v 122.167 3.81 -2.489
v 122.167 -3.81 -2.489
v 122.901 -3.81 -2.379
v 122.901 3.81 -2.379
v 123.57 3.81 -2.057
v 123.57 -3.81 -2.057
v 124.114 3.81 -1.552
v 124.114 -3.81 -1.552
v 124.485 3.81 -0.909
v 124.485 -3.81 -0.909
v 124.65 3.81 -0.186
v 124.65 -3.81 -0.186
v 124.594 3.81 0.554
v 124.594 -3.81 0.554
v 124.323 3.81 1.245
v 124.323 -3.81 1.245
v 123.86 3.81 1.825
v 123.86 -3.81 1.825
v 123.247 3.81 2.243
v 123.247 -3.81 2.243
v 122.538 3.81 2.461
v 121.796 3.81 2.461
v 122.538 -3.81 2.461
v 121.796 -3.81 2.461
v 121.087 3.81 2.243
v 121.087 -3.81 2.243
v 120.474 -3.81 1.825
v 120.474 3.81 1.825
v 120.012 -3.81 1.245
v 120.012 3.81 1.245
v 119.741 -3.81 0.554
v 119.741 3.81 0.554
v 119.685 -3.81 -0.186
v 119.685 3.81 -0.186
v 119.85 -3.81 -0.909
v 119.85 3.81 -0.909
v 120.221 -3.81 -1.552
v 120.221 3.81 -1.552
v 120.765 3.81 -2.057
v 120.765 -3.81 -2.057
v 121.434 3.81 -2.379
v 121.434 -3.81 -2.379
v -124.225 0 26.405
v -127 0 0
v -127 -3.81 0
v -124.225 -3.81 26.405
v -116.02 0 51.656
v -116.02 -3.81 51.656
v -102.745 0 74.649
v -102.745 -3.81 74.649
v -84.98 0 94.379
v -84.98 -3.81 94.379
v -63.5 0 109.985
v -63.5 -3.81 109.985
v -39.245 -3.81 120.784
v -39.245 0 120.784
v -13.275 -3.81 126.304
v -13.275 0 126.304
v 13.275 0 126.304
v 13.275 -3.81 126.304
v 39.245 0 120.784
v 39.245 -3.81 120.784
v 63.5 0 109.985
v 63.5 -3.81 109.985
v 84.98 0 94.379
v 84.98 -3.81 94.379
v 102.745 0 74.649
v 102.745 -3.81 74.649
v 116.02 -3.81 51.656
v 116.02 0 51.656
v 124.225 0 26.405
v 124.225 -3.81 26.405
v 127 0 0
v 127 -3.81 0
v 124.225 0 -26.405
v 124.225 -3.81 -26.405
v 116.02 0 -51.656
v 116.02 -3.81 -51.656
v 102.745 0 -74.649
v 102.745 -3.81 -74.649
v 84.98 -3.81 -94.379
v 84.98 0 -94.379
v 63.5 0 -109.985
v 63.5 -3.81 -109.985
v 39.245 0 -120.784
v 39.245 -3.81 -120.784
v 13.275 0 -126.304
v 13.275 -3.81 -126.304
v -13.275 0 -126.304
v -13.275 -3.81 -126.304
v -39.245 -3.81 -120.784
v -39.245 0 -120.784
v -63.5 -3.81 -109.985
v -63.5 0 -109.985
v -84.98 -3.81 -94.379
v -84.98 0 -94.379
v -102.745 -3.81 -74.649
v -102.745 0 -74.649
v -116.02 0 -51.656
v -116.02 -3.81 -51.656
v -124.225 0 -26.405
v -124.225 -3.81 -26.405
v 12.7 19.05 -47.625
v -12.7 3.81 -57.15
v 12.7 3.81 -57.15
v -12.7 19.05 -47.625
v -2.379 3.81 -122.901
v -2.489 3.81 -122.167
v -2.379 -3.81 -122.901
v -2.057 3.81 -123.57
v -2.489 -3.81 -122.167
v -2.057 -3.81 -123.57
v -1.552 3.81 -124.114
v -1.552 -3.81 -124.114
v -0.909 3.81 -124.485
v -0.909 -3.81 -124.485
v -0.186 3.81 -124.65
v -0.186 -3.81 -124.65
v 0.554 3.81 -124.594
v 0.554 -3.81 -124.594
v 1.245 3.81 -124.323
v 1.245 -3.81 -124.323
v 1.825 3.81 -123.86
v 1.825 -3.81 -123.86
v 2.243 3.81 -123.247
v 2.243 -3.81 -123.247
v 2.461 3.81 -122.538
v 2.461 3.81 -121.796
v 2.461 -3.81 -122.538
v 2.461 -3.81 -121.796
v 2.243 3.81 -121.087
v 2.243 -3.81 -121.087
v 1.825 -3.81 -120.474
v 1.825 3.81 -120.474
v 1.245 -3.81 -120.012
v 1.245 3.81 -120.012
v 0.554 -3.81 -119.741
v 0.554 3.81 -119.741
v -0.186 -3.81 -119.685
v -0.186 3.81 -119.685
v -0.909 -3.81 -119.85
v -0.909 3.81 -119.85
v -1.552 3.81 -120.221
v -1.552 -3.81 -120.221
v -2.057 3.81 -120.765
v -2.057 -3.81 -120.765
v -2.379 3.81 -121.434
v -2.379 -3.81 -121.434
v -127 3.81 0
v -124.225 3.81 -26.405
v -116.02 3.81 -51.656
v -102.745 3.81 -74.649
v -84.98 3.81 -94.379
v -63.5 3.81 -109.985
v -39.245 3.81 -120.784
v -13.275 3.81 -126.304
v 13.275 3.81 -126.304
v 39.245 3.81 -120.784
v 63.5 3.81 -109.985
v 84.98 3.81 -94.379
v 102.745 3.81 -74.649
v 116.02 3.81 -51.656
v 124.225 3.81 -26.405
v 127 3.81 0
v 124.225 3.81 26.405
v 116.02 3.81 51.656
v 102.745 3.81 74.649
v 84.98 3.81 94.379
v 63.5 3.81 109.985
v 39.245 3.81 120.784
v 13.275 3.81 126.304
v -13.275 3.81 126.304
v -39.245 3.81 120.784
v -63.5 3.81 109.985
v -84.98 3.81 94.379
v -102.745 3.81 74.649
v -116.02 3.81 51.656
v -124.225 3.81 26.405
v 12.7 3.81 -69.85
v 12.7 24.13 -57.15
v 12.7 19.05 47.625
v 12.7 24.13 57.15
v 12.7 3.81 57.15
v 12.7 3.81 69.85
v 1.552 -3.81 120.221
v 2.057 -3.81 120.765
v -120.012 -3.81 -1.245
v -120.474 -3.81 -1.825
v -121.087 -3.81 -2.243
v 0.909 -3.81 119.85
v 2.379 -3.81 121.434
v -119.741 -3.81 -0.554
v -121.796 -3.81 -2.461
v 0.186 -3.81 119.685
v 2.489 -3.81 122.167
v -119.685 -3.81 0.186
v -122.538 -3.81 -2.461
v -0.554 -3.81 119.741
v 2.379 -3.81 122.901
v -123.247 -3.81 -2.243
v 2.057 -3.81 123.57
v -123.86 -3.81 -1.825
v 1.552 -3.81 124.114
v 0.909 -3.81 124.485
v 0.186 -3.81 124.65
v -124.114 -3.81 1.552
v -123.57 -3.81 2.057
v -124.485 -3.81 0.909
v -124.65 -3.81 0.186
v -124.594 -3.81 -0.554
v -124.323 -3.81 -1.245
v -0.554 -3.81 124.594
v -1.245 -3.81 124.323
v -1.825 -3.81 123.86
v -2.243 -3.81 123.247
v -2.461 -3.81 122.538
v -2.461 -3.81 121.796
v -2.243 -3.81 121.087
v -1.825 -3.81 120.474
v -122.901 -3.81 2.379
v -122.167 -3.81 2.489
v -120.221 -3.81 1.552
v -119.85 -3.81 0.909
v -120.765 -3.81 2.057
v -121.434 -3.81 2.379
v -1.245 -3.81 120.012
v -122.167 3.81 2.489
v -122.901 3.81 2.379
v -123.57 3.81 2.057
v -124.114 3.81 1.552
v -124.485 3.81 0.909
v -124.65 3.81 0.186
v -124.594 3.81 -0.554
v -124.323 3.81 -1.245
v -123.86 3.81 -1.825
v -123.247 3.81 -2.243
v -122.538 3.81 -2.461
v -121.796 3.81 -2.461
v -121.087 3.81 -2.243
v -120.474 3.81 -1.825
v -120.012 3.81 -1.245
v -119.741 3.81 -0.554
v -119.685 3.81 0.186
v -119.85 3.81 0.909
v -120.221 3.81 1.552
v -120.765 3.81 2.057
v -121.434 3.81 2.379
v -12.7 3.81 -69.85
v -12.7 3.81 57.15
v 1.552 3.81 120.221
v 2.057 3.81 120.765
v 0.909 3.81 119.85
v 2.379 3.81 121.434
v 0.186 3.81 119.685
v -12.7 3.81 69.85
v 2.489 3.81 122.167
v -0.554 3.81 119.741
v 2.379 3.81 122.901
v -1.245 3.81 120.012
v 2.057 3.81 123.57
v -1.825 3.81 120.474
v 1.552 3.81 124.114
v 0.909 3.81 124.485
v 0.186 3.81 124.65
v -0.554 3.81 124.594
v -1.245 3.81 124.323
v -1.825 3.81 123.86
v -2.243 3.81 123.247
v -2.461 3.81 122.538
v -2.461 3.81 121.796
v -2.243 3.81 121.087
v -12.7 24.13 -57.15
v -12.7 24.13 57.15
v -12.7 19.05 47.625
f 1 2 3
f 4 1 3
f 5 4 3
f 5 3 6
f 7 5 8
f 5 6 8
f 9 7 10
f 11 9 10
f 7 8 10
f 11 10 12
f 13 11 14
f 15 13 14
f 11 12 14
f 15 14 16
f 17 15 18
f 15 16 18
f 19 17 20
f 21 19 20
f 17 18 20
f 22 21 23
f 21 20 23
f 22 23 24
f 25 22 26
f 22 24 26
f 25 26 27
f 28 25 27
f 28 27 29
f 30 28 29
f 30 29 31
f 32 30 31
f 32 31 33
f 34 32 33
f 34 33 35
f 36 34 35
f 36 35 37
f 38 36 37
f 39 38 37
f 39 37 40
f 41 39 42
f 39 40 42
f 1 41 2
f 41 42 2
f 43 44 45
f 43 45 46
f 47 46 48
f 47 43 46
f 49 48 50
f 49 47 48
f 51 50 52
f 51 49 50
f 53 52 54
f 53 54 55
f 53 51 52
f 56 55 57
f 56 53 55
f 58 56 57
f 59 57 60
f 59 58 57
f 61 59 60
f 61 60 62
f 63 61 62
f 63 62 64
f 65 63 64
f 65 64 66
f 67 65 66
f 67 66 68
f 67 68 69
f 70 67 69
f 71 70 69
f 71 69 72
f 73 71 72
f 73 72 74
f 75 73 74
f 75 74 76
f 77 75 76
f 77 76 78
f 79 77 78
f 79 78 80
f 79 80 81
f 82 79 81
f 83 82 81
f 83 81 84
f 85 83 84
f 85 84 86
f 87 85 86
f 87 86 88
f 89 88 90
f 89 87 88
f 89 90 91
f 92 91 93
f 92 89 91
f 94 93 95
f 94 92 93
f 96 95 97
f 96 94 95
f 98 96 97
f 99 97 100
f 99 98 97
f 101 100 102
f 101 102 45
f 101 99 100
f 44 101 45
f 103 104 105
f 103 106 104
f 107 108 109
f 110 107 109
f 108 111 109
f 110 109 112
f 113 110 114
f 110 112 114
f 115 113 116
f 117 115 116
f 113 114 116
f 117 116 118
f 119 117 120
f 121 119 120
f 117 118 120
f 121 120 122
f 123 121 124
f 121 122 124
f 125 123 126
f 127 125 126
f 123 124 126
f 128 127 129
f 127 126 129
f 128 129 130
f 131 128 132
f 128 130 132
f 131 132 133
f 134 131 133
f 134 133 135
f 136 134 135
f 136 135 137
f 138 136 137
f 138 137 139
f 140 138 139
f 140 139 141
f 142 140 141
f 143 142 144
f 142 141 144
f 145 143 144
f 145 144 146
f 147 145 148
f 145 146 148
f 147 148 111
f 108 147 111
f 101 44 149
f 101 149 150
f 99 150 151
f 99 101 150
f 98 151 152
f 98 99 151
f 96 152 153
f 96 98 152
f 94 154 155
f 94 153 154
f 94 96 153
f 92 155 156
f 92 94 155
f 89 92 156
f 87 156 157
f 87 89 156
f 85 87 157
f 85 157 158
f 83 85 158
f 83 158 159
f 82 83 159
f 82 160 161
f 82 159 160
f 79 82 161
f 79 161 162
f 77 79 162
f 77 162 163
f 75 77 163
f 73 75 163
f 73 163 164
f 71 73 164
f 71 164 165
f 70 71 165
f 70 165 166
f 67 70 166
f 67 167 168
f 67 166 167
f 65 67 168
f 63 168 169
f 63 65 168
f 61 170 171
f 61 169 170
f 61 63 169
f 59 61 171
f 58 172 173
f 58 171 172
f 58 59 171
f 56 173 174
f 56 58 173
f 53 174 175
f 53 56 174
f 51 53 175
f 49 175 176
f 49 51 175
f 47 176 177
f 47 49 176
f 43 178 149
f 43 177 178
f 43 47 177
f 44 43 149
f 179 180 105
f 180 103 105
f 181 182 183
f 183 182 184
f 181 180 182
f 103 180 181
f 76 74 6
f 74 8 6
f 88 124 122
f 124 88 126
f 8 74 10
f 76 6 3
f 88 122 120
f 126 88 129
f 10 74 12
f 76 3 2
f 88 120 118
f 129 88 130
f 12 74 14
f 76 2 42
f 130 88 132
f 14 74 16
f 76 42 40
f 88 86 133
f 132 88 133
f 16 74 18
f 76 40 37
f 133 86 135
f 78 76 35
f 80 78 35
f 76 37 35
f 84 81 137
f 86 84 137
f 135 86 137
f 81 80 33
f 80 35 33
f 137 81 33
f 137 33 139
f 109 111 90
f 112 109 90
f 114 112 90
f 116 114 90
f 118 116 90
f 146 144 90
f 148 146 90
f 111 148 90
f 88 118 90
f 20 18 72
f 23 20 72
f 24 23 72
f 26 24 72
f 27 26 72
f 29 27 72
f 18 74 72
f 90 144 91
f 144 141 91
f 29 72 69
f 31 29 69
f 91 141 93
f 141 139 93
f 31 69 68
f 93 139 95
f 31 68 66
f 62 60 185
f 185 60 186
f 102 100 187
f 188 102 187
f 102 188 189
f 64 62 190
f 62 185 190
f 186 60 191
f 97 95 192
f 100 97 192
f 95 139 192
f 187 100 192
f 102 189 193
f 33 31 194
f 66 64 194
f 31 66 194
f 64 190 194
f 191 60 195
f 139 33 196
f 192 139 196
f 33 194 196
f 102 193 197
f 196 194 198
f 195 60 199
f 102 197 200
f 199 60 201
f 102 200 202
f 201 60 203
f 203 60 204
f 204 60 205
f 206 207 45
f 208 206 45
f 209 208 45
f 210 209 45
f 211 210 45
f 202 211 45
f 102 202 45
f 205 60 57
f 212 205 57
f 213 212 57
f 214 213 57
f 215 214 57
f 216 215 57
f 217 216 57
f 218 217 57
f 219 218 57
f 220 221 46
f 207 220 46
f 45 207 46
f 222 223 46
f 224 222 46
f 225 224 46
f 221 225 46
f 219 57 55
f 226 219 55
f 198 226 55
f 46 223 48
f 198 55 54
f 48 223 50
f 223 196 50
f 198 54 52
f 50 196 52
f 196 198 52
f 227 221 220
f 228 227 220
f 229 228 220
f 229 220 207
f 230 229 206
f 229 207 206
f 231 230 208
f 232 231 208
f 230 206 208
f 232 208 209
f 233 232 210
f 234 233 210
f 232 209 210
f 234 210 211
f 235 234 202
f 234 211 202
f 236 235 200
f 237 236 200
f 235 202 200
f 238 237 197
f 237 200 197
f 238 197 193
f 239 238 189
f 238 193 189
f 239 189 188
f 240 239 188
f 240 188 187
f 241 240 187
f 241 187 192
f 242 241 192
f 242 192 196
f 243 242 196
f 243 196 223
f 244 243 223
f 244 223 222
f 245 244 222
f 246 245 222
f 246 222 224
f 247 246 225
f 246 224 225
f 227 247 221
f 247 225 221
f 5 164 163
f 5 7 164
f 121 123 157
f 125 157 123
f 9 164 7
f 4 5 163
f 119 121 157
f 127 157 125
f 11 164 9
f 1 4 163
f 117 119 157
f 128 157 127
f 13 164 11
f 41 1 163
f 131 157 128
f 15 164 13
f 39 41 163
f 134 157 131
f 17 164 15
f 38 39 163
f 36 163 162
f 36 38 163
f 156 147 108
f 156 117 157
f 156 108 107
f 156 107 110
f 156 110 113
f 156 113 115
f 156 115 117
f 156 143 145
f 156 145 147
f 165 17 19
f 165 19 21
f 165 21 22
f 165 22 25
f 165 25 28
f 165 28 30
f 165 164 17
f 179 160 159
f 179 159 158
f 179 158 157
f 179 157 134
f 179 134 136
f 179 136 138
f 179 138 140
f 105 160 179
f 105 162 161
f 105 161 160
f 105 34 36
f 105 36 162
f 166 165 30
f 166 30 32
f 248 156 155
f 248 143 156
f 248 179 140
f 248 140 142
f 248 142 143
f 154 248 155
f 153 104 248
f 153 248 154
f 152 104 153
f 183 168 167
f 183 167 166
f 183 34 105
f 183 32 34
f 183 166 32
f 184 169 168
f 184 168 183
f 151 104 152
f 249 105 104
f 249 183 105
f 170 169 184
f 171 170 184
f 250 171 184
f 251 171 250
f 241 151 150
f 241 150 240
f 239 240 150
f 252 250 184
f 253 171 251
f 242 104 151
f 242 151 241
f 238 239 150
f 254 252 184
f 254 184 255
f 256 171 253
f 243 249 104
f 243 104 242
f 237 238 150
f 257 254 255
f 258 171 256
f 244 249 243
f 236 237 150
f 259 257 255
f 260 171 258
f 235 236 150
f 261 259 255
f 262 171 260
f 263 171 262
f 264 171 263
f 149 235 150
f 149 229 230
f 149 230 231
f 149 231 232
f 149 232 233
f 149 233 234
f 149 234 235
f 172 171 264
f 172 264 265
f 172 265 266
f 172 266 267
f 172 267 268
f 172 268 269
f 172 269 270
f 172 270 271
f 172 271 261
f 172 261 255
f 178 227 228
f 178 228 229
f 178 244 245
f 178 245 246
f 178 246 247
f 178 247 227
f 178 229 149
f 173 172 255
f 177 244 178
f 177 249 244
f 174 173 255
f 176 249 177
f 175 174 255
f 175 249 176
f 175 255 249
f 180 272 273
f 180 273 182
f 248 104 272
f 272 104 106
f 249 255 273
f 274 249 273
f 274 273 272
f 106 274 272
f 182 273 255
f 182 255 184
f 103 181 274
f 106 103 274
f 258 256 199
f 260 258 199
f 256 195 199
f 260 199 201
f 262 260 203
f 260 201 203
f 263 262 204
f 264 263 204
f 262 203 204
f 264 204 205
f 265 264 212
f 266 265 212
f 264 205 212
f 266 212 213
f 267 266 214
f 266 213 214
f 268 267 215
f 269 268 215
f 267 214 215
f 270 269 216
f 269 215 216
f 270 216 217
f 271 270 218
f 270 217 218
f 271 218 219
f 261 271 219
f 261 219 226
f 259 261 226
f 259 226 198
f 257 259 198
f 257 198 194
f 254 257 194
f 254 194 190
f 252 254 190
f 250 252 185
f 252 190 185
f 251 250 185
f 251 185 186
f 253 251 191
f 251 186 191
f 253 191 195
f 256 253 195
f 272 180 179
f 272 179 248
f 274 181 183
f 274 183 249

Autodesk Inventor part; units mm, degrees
ref_plane "YZ Plane" through (0, 0, 0) normal (1, 0, 0) x (0, 1, 0)
ref_plane "XZ Plane" through (0, 0, 0) normal (0, 1, 0) x (-1, 0, 0)
sketch "Sketch1" plane through (0, 0, 0) normal (0, 1, 0) x (-1, 0, 0)
  circle A0 centre (0, 0) radius 127
  dimension "d0" = 254
extrude "Extrusion1" add sketch "Sketch1" along normal mid plane 7.62
sketch "Sketch2" plane through (0, 3.81, 0) normal (0, 1, 0) x (1, 0, 0)
  line L0 (0, 0) -> (0, -63.5)
  line L1 (12.7, -69.85) -> (-12.7, -69.85)
  line L2 (-12.7, -69.85) -> (-12.7, -57.15)
  line L3 (-12.7, -57.15) -> (12.7, -57.15)
  line L4 (12.7, -57.15) -> (12.7, -69.85)
  line L5 (12.7, -69.85) -> (-12.7, -57.15) construction
  line L6 (-12.7, -69.85) -> (12.7, -57.15) construction
  dimension "d4" = 63.5
  dimension "d5" = 12.7
  dimension "d6" = 25.4
ref_plane "Work Plane1" through (0, 24.13, 0) normal (0, 1, 0) x (1, 0, 0)
sketch "Sketch3" plane through (0, 24.13, 0) normal (0, 1, 0) x (1, 0, 0)
  line L0 (0, 0) -> (0, -50.8)
  line L1 (12.7, -57.15) -> (-12.7, -57.15)
  line L2 (-12.7, -57.15) -> (-12.7, -44.45)
  line L3 (-12.7, -44.45) -> (12.7, -44.45)
  line L4 (12.7, -44.45) -> (12.7, -57.15)
  line L5 (12.7, -57.15) -> (-12.7, -44.45) construction
  line L6 (-12.7, -57.15) -> (12.7, -44.45) construction
  dimension "d8" = 50.8
  dimension "d9" = 12.7
  dimension "d10" = 25.4
loft "Loft1" add profiles "Sketch2", "Sketch3"
sketch "Sketch4" plane through (0, 0, 0) normal (0, 0, 1) x (1, 0, 0)
  line L0 (0, 0) -> (0, 24.13)
  line L1 (12.7, 24.13) -> (-12.7, 24.13) projected
  line L2 (0, 24.13) -> (0, 21.59)
  line L3 (-12.7, 19.05) -> (12.7, 19.05)
  line L4 (12.7, 19.05) -> (12.7, 24.13)
  line L5 (12.7, 24.13) -> (-12.7, 24.13)
  line L6 (-12.7, 24.13) -> (-12.7, 19.05)
  line L7 (-12.7, 19.05) -> (12.7, 24.13) construction
  line L8 (12.7, 19.05) -> (-12.7, 24.13) construction
  dimension "d15" = 2.54
  dimension "d16" = 25.4
extrude "Extrusion2" add sketch "Sketch4" along normal up to next
mirror "Mirror1" about plane through (0, 0, 0) normal (0, 0, 1) of "Loft1", "Extrusion2"
sketch "Sketch5" plane through (0, 3.81, 0) normal (0, 1, 0) x (1, 0, 0)
  line L0 (0, 0) -> (-122.1674, 0)
  dimension "d19" = 122.1674
hole "Hole1" at (-122.1674, 3.81, 0) direction (0, -1, 0) diameter 4.9784 depth 19.05 tip angle 118 thread size "1/4-20 UNC" class "2B" standard "ANSI Unified Screw Threads"
pattern_circular "Circular Pattern1" count 4 over 360 about axis through (0, -10, 0) along (0, 1, 0) of "Hole1"
properties part number "Avi Bay Lid" material "Steel, Alloy"
